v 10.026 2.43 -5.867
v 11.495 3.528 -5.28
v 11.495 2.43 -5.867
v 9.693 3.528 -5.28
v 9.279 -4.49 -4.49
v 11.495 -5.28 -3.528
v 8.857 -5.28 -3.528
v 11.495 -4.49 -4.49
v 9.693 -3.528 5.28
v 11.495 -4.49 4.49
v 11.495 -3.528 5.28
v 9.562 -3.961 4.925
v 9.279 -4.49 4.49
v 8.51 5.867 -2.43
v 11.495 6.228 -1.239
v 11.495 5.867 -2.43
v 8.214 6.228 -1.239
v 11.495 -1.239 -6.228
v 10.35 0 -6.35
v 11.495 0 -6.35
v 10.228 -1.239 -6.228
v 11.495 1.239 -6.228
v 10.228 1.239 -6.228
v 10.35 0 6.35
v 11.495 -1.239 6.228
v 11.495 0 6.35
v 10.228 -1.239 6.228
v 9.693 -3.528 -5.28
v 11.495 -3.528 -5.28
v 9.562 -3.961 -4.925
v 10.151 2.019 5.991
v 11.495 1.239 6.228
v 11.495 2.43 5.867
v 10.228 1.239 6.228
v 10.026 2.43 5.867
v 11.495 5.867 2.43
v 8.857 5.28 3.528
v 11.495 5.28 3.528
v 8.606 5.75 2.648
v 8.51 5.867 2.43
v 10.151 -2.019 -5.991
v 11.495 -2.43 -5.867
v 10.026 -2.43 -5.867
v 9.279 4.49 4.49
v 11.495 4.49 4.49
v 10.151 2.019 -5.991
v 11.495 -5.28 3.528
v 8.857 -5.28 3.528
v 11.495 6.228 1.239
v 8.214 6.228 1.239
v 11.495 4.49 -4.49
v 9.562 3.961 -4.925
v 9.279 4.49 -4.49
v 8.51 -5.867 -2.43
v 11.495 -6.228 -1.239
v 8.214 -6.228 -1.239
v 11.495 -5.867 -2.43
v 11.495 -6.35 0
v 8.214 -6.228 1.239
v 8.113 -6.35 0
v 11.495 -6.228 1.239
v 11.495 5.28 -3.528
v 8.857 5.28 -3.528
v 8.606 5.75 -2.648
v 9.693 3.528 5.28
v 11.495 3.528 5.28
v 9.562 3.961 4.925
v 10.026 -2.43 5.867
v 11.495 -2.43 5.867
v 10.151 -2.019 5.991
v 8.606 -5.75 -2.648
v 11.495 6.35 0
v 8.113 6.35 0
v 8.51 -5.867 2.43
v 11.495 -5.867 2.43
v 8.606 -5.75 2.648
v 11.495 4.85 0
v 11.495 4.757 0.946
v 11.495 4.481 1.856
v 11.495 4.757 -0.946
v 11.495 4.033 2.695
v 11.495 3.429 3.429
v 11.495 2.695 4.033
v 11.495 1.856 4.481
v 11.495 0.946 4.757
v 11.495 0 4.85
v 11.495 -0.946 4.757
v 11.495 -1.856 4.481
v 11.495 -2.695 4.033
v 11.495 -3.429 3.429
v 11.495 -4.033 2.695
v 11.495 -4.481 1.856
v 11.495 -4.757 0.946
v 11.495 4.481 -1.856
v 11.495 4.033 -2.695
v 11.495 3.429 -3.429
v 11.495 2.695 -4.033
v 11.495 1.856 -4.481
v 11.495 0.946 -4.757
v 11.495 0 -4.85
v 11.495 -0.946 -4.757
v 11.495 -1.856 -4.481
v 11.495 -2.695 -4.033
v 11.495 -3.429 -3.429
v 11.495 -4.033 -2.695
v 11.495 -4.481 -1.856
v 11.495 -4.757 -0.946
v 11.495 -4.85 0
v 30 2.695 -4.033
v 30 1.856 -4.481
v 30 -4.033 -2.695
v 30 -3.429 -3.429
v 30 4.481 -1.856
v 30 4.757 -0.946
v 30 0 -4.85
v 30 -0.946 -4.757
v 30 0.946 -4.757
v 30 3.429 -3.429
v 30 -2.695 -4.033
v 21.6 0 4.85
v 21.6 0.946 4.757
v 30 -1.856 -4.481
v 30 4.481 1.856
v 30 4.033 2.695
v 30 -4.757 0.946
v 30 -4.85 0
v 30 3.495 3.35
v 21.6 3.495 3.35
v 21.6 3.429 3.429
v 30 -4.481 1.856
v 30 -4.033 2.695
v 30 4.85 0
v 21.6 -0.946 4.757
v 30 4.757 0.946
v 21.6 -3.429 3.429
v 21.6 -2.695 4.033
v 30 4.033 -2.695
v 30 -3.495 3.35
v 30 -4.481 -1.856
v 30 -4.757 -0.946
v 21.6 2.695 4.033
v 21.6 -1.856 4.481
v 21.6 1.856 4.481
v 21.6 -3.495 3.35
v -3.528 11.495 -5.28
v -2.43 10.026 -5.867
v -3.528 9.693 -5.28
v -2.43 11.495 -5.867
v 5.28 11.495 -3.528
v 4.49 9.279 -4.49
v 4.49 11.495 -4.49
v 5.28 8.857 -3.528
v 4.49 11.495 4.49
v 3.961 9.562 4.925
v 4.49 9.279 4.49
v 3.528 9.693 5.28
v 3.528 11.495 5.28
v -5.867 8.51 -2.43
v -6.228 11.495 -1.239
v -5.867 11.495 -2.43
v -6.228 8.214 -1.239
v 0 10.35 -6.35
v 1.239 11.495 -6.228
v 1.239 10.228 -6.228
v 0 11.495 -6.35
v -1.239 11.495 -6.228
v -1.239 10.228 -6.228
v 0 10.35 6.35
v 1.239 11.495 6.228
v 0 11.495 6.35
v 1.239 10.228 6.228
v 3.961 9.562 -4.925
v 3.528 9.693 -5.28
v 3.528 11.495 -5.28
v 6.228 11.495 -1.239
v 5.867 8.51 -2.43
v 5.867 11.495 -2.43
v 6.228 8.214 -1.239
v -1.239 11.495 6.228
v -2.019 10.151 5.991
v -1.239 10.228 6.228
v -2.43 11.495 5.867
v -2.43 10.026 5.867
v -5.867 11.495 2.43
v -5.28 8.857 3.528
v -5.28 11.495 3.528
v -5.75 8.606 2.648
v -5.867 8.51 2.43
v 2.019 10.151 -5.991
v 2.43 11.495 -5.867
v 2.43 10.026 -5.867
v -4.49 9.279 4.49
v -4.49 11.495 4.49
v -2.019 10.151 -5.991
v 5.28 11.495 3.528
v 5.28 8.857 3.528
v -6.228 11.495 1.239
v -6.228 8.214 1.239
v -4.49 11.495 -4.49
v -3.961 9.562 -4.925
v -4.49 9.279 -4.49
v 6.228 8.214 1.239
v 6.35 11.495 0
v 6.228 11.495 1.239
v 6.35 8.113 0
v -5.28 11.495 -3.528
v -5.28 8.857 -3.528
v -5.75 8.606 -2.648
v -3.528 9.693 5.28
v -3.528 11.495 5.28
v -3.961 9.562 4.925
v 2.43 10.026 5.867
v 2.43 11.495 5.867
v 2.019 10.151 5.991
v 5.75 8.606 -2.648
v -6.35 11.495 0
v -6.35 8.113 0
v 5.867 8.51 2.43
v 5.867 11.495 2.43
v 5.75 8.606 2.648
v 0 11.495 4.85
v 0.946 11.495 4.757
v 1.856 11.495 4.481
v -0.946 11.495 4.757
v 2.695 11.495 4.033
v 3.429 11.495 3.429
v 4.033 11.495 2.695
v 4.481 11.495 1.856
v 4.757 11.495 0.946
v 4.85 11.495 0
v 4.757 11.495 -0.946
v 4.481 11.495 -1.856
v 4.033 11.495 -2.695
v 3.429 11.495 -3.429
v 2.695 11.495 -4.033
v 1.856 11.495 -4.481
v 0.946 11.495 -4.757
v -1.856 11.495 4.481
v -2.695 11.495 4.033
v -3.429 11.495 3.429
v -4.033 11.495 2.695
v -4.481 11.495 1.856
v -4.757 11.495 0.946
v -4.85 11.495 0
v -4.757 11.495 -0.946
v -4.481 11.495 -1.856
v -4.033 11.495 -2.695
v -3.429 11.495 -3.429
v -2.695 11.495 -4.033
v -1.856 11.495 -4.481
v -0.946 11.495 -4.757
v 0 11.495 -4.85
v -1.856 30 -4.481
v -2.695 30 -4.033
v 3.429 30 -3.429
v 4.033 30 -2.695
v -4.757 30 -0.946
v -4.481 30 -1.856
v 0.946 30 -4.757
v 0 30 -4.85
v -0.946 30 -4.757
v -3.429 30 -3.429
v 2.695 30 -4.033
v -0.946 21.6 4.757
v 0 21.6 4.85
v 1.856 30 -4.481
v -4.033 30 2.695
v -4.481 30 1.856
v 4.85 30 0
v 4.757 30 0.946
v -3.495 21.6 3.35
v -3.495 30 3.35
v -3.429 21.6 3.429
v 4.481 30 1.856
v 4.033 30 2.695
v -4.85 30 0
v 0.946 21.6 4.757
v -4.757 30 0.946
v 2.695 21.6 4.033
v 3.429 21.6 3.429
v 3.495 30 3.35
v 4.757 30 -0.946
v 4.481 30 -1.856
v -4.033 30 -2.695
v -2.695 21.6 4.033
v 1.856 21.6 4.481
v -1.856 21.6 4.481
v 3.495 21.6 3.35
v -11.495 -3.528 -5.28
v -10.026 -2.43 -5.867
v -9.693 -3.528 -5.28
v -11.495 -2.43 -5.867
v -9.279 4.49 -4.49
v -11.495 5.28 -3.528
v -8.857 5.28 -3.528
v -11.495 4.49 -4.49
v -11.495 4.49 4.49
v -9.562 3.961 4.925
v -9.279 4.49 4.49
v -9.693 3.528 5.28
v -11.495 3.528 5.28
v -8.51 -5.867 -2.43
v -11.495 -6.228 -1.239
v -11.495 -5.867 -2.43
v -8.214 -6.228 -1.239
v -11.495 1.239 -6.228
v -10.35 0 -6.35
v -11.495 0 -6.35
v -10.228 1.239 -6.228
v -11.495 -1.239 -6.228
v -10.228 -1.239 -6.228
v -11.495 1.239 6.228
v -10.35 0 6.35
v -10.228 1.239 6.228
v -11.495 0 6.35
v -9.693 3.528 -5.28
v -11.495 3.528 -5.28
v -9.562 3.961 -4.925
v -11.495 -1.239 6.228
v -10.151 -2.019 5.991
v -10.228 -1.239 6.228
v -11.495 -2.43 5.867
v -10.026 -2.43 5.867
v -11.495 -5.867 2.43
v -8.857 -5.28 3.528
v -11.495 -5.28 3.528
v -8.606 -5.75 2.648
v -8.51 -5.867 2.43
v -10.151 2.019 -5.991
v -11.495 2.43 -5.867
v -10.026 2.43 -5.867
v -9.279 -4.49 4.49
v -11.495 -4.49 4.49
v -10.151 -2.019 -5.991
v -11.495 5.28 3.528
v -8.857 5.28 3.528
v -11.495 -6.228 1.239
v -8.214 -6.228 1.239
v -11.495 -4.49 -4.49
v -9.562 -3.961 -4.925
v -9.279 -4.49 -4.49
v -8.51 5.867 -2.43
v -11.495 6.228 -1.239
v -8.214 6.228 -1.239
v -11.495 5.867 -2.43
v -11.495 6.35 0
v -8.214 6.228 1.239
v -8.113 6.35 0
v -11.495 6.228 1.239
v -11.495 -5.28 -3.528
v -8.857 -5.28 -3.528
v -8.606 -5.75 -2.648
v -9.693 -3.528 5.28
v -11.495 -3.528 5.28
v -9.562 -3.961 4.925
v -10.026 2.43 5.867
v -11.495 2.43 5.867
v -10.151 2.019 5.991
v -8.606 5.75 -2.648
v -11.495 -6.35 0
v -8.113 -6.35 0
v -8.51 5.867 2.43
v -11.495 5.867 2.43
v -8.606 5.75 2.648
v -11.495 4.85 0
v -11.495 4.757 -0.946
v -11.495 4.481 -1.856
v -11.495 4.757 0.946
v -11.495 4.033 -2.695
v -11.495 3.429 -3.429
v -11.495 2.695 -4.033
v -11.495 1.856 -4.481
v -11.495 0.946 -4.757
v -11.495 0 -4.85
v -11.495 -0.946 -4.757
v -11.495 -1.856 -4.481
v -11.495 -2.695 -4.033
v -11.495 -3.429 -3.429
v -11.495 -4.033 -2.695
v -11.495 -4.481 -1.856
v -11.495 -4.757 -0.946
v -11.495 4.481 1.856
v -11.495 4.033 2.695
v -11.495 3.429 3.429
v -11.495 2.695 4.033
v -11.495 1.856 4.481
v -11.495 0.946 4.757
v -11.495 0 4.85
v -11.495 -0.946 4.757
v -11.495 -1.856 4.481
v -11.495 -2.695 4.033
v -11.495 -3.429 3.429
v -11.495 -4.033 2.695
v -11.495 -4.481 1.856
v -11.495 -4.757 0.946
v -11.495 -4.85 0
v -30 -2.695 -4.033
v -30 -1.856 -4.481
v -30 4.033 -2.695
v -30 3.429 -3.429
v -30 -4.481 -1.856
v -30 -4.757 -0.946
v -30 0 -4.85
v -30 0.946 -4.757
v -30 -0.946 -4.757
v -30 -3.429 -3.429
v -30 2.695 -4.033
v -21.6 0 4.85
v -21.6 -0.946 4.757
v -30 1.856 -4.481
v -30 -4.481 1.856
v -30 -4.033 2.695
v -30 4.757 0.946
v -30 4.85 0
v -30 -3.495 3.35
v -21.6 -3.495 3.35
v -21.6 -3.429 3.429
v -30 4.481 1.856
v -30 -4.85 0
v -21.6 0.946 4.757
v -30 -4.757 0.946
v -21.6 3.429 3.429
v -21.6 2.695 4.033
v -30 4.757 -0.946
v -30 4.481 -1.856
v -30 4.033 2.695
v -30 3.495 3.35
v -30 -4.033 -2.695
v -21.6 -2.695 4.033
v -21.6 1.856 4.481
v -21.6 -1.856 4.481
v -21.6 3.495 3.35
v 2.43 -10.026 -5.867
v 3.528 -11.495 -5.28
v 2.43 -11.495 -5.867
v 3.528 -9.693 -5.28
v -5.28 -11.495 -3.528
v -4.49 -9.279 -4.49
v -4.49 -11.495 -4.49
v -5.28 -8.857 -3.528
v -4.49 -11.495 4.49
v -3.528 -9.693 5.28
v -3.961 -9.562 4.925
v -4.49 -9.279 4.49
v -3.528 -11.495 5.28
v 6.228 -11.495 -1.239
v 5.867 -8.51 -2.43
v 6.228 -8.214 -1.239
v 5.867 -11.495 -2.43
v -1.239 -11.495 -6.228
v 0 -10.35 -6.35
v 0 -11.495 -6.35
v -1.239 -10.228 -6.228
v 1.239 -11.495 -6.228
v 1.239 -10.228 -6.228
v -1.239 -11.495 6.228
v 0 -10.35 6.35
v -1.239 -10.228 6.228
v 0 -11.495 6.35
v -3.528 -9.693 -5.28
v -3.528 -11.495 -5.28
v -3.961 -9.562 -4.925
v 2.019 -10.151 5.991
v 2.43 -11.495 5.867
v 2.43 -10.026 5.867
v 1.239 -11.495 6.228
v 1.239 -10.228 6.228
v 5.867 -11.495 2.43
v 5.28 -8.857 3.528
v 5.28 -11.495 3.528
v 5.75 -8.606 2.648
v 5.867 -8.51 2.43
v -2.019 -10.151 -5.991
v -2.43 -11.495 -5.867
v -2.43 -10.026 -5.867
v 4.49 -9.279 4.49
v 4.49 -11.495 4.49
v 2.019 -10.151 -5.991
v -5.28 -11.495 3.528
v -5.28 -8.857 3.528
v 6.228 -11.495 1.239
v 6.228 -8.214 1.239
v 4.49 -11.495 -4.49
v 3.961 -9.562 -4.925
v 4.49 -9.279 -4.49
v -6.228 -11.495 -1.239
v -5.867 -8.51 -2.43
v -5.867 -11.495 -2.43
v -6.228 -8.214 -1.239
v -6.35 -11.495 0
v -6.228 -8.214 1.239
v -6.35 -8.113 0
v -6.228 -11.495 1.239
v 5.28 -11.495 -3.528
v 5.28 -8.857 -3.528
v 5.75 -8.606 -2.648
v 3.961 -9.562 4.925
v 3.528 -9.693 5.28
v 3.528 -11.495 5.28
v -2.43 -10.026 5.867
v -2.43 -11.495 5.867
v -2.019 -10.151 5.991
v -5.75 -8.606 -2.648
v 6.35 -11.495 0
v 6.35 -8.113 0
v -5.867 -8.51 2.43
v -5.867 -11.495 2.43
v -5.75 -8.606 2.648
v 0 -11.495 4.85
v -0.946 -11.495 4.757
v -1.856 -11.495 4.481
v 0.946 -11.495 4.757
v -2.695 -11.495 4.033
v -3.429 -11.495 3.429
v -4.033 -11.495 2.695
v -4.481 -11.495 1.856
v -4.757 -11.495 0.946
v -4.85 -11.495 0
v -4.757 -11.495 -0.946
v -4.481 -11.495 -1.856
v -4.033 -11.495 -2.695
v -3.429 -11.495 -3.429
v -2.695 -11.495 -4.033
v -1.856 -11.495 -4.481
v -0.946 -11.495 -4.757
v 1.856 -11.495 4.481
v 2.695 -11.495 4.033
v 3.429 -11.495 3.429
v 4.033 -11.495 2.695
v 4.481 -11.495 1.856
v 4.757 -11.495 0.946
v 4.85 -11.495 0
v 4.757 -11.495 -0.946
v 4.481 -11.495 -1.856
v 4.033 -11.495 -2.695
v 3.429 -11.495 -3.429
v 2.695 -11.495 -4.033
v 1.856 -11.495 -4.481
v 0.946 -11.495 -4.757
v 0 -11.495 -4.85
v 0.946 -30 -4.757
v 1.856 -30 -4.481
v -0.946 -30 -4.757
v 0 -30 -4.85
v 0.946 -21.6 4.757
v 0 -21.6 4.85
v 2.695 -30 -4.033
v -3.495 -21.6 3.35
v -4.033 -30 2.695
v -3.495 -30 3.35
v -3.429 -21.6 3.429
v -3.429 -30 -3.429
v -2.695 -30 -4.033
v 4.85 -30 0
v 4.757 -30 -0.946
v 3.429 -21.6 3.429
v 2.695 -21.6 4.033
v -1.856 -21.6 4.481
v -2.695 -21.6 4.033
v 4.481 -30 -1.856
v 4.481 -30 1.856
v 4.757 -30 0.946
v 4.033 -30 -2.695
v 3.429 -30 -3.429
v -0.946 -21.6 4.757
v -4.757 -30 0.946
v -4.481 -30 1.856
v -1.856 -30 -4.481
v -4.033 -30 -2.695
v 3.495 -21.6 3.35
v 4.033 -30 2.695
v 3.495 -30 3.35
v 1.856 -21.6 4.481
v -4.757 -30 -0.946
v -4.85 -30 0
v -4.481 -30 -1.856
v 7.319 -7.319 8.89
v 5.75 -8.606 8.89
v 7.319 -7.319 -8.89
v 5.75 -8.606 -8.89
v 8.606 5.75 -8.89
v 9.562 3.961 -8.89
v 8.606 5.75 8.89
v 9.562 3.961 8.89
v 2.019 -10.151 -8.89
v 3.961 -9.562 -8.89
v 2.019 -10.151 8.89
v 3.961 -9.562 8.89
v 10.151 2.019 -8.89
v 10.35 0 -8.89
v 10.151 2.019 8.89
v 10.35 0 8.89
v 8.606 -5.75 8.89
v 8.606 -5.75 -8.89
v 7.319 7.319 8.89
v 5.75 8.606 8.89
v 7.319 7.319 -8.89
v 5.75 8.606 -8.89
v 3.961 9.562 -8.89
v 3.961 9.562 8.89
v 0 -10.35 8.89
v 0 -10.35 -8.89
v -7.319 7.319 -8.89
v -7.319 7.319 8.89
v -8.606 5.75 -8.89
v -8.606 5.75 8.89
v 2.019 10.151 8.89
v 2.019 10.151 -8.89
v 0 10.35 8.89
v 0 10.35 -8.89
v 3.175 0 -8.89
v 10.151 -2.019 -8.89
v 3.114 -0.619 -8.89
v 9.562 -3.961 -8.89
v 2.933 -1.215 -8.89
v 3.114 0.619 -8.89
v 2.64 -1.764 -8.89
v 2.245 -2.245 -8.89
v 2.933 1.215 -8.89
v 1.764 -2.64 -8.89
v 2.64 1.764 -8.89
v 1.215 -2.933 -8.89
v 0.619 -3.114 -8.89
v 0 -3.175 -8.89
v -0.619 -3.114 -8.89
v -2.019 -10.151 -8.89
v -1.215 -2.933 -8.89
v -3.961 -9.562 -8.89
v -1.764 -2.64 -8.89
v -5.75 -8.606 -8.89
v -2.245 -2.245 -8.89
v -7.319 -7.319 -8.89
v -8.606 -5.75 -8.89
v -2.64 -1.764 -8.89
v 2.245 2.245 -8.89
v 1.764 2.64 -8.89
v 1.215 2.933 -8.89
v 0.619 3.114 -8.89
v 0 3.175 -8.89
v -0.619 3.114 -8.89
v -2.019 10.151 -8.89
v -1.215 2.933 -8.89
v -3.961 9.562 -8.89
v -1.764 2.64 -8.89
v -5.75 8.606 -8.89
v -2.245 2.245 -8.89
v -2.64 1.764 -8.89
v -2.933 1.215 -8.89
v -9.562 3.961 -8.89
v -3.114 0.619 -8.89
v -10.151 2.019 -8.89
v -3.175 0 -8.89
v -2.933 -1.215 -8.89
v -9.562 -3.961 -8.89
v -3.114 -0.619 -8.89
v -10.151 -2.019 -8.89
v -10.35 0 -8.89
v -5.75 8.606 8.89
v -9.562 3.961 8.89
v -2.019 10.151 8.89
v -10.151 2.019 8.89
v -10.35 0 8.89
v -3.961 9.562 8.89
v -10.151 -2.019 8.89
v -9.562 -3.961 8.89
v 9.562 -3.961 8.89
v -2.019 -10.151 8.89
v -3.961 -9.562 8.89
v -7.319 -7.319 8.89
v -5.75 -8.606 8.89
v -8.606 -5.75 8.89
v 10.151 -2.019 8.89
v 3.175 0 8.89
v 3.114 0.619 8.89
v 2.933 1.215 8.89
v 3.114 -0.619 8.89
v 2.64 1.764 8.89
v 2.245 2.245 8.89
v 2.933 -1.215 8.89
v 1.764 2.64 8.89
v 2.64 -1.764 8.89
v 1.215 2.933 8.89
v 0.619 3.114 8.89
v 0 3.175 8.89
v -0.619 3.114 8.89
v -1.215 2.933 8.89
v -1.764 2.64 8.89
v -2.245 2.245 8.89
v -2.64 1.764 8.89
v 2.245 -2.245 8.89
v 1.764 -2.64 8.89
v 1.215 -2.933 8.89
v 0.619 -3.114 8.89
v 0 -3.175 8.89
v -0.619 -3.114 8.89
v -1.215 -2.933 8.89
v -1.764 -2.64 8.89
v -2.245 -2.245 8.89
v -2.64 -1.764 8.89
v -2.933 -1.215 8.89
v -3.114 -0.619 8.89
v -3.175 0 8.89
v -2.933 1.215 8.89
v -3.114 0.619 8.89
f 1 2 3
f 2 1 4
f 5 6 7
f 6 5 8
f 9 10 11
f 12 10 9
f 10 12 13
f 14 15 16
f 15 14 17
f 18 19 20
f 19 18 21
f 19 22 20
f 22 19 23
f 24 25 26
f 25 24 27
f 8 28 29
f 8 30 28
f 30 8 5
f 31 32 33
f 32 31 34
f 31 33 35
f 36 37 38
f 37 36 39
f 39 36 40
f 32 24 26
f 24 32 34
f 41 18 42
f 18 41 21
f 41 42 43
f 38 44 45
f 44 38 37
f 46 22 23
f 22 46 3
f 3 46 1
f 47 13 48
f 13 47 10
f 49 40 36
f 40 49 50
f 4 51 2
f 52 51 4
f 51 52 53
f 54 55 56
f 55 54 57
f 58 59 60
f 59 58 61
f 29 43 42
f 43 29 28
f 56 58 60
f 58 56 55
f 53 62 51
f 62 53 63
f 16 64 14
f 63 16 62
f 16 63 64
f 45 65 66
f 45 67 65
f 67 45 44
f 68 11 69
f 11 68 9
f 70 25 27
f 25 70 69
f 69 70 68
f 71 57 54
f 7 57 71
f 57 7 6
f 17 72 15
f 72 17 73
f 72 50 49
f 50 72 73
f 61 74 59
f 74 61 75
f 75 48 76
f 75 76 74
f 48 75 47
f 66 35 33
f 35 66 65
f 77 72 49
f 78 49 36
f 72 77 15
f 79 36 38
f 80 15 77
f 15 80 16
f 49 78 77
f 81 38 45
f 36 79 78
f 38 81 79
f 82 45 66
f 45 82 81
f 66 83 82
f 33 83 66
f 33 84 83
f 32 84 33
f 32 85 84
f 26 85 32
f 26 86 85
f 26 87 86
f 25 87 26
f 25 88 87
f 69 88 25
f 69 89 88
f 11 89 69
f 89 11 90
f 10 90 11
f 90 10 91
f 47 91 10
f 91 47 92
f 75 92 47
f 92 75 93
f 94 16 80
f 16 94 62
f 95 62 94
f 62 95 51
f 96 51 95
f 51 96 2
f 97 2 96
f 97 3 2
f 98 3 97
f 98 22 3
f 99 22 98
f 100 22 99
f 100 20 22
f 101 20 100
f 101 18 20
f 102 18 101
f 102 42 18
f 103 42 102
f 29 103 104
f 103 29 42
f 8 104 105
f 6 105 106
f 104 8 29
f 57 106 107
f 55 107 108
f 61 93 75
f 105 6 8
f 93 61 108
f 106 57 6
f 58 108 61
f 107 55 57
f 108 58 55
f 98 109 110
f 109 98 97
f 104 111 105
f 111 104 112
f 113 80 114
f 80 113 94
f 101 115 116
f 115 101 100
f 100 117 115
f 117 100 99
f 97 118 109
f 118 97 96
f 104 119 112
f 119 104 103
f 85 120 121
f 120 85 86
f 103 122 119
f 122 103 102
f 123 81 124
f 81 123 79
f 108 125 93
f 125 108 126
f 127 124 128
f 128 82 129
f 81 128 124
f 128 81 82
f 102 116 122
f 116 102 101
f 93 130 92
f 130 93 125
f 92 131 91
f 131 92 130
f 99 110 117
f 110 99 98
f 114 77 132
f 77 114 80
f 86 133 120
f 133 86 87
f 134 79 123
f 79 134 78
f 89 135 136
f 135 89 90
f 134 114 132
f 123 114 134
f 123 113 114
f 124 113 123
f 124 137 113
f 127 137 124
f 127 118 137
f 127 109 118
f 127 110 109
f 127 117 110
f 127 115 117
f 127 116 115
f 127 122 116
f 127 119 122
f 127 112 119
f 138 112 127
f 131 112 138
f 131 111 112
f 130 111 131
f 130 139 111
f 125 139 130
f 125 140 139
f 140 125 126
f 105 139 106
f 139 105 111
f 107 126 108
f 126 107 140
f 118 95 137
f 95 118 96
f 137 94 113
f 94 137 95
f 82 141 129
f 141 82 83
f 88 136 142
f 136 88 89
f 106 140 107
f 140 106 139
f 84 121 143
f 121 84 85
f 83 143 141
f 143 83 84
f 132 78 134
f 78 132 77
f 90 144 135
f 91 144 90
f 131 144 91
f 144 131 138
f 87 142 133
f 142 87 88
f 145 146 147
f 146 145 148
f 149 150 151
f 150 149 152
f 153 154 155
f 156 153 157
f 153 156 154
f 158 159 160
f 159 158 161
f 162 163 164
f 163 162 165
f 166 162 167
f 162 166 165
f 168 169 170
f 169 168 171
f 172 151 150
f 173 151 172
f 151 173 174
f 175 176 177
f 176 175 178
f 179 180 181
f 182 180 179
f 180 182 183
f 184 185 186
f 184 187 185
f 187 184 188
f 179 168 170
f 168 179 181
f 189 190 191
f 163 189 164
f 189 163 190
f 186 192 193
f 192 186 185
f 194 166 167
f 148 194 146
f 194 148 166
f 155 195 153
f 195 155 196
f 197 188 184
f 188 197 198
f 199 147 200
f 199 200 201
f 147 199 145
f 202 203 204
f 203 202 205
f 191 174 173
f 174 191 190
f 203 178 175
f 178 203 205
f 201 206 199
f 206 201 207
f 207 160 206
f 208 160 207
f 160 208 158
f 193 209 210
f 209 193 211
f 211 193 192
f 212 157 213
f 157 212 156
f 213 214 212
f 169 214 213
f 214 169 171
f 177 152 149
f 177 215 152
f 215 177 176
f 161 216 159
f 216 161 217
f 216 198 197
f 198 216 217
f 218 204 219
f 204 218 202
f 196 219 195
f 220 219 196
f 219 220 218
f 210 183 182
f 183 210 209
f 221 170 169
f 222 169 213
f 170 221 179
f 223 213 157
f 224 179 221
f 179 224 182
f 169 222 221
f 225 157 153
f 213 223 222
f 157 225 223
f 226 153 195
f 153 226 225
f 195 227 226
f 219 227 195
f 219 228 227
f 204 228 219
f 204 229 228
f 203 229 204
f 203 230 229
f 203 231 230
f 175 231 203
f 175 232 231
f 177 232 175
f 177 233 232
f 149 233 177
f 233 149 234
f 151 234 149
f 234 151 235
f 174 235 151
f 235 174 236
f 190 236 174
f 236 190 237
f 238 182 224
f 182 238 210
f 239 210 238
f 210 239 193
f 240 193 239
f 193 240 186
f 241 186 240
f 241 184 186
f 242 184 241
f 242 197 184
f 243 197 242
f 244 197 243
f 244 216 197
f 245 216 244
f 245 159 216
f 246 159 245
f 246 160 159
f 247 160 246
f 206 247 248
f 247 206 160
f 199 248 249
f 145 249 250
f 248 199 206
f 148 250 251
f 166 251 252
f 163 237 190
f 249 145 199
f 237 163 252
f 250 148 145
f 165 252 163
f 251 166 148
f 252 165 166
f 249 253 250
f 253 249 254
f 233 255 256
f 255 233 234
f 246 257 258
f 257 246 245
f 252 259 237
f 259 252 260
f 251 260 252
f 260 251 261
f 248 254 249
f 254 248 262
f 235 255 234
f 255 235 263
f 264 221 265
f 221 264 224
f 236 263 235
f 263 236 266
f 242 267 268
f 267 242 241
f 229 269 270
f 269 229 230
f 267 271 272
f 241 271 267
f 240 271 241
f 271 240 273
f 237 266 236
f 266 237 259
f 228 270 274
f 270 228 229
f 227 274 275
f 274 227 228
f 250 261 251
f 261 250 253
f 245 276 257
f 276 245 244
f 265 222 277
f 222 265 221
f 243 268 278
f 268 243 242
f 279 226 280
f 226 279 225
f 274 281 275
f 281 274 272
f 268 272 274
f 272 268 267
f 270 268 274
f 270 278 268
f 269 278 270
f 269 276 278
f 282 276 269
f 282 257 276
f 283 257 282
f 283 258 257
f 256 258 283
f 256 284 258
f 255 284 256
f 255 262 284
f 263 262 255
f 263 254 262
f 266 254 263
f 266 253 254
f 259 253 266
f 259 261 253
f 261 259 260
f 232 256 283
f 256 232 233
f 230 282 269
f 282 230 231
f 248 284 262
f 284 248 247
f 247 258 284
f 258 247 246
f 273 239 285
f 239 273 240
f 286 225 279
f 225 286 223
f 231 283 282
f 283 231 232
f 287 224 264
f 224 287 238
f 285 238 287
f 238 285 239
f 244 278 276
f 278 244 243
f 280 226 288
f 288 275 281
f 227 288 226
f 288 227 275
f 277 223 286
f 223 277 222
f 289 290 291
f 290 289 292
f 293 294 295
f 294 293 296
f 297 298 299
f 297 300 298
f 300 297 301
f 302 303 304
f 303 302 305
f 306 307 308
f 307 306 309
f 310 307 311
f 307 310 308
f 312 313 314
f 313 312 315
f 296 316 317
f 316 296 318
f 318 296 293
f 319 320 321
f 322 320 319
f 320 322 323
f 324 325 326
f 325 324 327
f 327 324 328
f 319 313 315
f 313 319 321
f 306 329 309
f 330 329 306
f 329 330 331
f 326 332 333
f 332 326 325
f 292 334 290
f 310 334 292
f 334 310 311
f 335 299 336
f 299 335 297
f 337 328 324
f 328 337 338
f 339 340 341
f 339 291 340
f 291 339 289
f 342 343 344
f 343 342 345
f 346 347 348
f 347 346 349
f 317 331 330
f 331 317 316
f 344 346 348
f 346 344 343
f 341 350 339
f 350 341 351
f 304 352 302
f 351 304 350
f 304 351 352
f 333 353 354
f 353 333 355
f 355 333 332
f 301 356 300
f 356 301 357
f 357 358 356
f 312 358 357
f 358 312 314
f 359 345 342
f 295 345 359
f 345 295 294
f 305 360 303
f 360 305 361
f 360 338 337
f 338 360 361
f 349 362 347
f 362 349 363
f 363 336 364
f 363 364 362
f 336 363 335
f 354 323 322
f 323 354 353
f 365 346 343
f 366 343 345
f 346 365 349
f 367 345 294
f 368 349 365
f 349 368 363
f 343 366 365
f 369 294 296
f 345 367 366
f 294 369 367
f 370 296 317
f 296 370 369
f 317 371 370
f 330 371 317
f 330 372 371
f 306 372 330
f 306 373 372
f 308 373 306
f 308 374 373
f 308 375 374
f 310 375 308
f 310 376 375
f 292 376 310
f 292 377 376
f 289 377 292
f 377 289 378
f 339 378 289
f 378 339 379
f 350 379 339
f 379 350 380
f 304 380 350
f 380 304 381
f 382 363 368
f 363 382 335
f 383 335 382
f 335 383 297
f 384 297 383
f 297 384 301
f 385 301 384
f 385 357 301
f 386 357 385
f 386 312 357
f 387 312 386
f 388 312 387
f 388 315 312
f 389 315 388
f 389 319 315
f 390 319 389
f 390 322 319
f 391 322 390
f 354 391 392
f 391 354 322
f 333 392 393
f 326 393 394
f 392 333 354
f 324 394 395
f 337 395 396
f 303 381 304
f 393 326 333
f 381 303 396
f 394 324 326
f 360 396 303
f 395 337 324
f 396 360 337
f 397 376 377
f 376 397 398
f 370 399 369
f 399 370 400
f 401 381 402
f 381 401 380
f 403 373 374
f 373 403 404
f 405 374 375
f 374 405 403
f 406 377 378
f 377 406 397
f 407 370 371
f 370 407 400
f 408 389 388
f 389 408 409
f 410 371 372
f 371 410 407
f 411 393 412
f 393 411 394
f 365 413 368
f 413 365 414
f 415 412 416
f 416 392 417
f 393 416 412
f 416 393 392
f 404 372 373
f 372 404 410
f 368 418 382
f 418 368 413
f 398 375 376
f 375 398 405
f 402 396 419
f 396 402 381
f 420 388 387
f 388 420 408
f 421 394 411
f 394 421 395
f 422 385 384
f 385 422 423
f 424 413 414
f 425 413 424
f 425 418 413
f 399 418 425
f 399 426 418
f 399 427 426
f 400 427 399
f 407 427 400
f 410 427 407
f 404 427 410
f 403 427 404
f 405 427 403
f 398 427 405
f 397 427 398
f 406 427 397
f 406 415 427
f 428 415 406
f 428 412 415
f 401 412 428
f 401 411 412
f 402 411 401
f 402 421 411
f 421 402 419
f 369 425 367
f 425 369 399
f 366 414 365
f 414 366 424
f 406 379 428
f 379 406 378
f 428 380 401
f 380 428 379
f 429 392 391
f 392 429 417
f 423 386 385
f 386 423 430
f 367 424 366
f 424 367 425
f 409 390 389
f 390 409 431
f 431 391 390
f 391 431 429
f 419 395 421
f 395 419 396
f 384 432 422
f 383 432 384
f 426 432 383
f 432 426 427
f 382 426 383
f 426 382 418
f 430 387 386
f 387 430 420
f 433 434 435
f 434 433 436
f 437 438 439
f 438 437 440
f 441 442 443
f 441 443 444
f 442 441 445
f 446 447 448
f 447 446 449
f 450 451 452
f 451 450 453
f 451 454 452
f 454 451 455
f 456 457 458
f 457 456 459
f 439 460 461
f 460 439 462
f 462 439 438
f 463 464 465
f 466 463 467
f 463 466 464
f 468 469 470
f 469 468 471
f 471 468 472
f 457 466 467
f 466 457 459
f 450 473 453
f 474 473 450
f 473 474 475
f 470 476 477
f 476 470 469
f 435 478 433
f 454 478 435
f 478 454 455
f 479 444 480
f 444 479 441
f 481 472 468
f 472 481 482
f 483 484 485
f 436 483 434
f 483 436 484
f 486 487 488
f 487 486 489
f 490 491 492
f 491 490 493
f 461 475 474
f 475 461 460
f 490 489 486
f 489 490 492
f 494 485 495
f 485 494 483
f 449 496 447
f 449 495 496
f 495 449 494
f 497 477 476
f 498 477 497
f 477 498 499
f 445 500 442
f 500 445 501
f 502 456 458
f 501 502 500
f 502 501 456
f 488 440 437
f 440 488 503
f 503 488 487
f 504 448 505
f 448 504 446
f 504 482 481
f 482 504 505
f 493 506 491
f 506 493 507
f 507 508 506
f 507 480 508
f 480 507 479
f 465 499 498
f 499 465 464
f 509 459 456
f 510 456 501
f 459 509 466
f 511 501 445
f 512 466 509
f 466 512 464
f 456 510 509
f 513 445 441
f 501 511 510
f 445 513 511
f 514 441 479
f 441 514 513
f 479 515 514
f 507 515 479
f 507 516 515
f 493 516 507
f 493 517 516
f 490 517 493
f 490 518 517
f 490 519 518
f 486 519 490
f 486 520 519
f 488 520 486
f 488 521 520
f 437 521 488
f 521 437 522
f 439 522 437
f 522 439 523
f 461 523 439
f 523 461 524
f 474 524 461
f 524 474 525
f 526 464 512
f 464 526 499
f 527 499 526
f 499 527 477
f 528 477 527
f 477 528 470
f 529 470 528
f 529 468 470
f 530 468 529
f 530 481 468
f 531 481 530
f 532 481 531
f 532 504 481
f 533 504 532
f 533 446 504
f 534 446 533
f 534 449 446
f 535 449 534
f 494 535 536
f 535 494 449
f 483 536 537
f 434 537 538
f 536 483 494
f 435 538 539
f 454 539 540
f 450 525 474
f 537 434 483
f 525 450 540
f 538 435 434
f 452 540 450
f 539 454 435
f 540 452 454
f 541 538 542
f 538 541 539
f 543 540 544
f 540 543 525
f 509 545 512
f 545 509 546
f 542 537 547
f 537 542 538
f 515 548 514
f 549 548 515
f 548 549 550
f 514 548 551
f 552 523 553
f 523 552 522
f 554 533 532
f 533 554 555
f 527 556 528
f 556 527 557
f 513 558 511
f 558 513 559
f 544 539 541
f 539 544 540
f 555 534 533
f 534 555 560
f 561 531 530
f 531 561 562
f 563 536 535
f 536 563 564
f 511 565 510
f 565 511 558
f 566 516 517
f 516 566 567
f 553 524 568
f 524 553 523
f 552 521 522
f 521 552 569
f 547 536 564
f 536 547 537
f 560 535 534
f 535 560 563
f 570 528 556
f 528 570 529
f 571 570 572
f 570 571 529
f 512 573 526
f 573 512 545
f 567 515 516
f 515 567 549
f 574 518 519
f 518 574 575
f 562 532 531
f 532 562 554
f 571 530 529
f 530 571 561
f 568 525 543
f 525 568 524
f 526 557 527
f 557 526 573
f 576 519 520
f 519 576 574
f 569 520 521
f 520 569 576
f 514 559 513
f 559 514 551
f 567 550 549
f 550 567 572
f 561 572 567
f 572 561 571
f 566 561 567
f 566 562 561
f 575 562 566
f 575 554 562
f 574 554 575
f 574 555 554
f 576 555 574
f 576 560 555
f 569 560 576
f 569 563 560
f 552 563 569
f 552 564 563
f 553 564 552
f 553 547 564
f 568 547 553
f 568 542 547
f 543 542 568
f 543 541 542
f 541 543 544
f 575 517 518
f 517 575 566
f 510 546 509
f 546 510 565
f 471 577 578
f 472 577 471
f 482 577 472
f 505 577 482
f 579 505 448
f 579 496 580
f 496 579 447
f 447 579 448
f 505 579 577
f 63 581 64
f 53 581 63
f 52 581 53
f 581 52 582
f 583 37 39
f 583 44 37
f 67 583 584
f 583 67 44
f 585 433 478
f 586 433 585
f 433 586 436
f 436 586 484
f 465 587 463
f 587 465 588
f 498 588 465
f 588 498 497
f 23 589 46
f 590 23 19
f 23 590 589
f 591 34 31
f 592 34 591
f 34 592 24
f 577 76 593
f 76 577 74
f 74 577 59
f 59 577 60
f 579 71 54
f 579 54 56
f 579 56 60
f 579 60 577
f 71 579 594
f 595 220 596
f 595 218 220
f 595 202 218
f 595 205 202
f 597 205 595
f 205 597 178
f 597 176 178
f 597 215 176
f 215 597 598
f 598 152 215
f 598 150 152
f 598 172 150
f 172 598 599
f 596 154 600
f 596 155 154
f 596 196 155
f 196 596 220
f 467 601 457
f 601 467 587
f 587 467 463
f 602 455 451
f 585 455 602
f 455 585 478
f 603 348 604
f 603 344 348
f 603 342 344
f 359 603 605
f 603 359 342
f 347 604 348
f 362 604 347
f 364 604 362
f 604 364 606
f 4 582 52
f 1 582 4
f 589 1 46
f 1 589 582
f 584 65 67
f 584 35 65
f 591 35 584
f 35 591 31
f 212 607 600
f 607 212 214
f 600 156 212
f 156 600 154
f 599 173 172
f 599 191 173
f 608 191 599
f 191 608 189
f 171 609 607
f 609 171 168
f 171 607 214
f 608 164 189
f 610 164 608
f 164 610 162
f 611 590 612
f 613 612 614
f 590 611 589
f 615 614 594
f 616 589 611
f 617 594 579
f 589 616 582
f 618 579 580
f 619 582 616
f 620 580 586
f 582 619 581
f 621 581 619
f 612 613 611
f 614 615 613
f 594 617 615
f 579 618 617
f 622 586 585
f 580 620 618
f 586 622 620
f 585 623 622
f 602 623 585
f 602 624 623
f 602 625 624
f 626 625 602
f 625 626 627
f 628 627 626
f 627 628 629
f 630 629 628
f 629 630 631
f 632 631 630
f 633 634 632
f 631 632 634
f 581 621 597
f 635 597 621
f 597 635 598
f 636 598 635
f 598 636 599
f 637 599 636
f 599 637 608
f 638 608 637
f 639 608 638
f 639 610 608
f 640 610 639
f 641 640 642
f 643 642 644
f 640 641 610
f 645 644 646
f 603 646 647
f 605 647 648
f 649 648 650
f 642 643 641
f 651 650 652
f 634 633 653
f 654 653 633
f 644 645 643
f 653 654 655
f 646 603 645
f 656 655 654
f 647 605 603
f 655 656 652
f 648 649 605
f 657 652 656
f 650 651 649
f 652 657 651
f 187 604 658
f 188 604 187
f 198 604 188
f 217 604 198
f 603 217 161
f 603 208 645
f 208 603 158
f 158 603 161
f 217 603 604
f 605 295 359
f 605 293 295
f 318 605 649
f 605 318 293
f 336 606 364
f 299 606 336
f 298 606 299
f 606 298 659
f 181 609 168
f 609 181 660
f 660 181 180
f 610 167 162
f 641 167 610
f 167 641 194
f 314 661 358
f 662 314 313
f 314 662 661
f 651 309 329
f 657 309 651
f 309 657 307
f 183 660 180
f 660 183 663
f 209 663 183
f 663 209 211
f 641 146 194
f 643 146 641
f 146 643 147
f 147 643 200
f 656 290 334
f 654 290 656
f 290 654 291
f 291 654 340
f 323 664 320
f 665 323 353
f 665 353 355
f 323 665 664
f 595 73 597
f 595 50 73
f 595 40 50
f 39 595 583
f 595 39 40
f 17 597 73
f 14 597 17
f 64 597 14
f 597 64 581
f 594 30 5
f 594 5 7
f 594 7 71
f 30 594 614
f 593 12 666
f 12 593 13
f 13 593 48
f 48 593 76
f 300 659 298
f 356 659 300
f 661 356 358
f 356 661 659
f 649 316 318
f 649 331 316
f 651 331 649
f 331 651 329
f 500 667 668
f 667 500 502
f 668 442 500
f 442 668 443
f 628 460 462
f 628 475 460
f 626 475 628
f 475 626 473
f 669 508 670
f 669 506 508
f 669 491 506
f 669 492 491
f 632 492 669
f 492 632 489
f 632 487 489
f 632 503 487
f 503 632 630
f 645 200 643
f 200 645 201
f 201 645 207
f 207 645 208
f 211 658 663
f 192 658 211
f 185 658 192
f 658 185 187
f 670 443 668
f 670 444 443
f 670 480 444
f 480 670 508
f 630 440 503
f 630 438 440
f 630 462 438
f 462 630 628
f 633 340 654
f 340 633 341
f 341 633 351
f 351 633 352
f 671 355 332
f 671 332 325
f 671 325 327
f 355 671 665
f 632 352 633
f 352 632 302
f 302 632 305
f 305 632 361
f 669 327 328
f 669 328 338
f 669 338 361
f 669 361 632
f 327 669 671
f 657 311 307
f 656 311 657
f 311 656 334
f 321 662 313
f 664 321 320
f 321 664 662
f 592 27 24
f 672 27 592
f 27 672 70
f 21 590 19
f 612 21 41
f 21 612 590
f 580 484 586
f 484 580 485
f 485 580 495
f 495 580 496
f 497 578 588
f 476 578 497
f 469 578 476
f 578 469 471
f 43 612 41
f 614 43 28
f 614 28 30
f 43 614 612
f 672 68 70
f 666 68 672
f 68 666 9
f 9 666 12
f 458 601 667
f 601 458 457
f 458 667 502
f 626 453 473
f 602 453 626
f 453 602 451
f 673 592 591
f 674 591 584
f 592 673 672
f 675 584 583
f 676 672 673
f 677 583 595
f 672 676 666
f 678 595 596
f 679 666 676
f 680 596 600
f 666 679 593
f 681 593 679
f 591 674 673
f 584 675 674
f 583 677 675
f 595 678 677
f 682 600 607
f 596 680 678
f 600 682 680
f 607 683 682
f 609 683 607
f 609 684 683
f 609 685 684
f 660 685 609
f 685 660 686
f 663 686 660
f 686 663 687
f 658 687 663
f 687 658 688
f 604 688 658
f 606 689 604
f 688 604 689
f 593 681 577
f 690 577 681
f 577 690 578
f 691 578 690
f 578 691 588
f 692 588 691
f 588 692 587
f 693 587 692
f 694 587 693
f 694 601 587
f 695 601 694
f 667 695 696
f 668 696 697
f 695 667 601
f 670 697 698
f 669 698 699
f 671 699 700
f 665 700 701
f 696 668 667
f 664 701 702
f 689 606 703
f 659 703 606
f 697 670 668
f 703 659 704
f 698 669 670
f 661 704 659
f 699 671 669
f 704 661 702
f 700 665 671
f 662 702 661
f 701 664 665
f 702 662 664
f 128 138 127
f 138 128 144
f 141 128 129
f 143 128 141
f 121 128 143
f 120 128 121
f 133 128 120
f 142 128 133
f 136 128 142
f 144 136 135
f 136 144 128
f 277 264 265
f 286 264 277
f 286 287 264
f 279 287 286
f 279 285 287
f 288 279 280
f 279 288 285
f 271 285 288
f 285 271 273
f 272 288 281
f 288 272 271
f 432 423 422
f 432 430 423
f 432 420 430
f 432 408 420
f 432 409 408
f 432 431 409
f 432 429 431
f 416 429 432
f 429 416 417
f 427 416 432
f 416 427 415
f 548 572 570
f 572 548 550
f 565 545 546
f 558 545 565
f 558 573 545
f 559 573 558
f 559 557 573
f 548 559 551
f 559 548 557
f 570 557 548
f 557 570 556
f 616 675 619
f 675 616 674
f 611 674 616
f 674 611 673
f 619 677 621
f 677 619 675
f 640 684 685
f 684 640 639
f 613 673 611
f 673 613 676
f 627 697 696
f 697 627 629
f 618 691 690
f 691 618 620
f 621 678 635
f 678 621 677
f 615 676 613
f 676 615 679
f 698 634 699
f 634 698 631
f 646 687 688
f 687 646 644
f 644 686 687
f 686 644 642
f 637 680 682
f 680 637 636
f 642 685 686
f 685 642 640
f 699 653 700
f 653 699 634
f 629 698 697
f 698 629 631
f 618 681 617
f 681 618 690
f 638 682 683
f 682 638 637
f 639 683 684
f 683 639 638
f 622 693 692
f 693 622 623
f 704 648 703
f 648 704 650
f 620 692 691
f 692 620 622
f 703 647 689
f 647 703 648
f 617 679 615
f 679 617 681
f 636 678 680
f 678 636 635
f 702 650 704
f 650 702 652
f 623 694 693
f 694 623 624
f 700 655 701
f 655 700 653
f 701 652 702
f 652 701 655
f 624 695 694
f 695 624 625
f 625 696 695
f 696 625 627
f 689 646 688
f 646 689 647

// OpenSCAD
$fn = 32;

// ----------------------------------------------------------------------
// Cardan cross: 60 mm span, 12.7 mm trunnions
// ----------------------------------------------------------------------

// --- parameters (mm) ---
journal_d = 12.7;         // trunnion diameter
arm_len = 30;             // trunnion length from the centre
step_r = 4.32;            // step position from the centre
step_d = 9.7;             // journal diameter after the step
hub_d = 20.7;             // hub diameter
hub_h = 17.78;            // hub height
bore_d = 6.35;            // hub bore
flat_d = 1.5;             // depth of the journal flat
flat_len = 8.4;           // length of the journal flat

difference() {
  union() {
    /* hub along the joint axis */
    cylinder(h = hub_h, d = hub_d, center = true);
    for (a = [0 : 90 : 270]) rotate([0, 0, a]) {
      /* trunnion, sunk into the hub */
      translate([hub_d / 4, 0, 0]) rotate([0, 90, 0]) cylinder(h = step_r + 2, d = journal_d);
      /* stepped journal out to the tip */
      translate([step_r - 0.5, 0, 0]) rotate([0, 90, 0]) cylinder(h = arm_len + 0.5 - step_r, d = step_d);
    }
  }
  /* lubrication bore through the hub, 2.5 mm clear on both sides */
  translate([0, 0, -hub_h / 2 - 2.5]) cylinder(h = hub_h + 5, d = bore_d);
  /* machined flat on each journal tip */
  for (a = [0 : 90 : 270]) rotate([0, 0, a]) {
    translate([arm_len - flat_len, -step_d, step_d / 2 - flat_d]) cube([flat_len + 0.5, 2 * step_d, flat_d + 2.5]);
  }
}
